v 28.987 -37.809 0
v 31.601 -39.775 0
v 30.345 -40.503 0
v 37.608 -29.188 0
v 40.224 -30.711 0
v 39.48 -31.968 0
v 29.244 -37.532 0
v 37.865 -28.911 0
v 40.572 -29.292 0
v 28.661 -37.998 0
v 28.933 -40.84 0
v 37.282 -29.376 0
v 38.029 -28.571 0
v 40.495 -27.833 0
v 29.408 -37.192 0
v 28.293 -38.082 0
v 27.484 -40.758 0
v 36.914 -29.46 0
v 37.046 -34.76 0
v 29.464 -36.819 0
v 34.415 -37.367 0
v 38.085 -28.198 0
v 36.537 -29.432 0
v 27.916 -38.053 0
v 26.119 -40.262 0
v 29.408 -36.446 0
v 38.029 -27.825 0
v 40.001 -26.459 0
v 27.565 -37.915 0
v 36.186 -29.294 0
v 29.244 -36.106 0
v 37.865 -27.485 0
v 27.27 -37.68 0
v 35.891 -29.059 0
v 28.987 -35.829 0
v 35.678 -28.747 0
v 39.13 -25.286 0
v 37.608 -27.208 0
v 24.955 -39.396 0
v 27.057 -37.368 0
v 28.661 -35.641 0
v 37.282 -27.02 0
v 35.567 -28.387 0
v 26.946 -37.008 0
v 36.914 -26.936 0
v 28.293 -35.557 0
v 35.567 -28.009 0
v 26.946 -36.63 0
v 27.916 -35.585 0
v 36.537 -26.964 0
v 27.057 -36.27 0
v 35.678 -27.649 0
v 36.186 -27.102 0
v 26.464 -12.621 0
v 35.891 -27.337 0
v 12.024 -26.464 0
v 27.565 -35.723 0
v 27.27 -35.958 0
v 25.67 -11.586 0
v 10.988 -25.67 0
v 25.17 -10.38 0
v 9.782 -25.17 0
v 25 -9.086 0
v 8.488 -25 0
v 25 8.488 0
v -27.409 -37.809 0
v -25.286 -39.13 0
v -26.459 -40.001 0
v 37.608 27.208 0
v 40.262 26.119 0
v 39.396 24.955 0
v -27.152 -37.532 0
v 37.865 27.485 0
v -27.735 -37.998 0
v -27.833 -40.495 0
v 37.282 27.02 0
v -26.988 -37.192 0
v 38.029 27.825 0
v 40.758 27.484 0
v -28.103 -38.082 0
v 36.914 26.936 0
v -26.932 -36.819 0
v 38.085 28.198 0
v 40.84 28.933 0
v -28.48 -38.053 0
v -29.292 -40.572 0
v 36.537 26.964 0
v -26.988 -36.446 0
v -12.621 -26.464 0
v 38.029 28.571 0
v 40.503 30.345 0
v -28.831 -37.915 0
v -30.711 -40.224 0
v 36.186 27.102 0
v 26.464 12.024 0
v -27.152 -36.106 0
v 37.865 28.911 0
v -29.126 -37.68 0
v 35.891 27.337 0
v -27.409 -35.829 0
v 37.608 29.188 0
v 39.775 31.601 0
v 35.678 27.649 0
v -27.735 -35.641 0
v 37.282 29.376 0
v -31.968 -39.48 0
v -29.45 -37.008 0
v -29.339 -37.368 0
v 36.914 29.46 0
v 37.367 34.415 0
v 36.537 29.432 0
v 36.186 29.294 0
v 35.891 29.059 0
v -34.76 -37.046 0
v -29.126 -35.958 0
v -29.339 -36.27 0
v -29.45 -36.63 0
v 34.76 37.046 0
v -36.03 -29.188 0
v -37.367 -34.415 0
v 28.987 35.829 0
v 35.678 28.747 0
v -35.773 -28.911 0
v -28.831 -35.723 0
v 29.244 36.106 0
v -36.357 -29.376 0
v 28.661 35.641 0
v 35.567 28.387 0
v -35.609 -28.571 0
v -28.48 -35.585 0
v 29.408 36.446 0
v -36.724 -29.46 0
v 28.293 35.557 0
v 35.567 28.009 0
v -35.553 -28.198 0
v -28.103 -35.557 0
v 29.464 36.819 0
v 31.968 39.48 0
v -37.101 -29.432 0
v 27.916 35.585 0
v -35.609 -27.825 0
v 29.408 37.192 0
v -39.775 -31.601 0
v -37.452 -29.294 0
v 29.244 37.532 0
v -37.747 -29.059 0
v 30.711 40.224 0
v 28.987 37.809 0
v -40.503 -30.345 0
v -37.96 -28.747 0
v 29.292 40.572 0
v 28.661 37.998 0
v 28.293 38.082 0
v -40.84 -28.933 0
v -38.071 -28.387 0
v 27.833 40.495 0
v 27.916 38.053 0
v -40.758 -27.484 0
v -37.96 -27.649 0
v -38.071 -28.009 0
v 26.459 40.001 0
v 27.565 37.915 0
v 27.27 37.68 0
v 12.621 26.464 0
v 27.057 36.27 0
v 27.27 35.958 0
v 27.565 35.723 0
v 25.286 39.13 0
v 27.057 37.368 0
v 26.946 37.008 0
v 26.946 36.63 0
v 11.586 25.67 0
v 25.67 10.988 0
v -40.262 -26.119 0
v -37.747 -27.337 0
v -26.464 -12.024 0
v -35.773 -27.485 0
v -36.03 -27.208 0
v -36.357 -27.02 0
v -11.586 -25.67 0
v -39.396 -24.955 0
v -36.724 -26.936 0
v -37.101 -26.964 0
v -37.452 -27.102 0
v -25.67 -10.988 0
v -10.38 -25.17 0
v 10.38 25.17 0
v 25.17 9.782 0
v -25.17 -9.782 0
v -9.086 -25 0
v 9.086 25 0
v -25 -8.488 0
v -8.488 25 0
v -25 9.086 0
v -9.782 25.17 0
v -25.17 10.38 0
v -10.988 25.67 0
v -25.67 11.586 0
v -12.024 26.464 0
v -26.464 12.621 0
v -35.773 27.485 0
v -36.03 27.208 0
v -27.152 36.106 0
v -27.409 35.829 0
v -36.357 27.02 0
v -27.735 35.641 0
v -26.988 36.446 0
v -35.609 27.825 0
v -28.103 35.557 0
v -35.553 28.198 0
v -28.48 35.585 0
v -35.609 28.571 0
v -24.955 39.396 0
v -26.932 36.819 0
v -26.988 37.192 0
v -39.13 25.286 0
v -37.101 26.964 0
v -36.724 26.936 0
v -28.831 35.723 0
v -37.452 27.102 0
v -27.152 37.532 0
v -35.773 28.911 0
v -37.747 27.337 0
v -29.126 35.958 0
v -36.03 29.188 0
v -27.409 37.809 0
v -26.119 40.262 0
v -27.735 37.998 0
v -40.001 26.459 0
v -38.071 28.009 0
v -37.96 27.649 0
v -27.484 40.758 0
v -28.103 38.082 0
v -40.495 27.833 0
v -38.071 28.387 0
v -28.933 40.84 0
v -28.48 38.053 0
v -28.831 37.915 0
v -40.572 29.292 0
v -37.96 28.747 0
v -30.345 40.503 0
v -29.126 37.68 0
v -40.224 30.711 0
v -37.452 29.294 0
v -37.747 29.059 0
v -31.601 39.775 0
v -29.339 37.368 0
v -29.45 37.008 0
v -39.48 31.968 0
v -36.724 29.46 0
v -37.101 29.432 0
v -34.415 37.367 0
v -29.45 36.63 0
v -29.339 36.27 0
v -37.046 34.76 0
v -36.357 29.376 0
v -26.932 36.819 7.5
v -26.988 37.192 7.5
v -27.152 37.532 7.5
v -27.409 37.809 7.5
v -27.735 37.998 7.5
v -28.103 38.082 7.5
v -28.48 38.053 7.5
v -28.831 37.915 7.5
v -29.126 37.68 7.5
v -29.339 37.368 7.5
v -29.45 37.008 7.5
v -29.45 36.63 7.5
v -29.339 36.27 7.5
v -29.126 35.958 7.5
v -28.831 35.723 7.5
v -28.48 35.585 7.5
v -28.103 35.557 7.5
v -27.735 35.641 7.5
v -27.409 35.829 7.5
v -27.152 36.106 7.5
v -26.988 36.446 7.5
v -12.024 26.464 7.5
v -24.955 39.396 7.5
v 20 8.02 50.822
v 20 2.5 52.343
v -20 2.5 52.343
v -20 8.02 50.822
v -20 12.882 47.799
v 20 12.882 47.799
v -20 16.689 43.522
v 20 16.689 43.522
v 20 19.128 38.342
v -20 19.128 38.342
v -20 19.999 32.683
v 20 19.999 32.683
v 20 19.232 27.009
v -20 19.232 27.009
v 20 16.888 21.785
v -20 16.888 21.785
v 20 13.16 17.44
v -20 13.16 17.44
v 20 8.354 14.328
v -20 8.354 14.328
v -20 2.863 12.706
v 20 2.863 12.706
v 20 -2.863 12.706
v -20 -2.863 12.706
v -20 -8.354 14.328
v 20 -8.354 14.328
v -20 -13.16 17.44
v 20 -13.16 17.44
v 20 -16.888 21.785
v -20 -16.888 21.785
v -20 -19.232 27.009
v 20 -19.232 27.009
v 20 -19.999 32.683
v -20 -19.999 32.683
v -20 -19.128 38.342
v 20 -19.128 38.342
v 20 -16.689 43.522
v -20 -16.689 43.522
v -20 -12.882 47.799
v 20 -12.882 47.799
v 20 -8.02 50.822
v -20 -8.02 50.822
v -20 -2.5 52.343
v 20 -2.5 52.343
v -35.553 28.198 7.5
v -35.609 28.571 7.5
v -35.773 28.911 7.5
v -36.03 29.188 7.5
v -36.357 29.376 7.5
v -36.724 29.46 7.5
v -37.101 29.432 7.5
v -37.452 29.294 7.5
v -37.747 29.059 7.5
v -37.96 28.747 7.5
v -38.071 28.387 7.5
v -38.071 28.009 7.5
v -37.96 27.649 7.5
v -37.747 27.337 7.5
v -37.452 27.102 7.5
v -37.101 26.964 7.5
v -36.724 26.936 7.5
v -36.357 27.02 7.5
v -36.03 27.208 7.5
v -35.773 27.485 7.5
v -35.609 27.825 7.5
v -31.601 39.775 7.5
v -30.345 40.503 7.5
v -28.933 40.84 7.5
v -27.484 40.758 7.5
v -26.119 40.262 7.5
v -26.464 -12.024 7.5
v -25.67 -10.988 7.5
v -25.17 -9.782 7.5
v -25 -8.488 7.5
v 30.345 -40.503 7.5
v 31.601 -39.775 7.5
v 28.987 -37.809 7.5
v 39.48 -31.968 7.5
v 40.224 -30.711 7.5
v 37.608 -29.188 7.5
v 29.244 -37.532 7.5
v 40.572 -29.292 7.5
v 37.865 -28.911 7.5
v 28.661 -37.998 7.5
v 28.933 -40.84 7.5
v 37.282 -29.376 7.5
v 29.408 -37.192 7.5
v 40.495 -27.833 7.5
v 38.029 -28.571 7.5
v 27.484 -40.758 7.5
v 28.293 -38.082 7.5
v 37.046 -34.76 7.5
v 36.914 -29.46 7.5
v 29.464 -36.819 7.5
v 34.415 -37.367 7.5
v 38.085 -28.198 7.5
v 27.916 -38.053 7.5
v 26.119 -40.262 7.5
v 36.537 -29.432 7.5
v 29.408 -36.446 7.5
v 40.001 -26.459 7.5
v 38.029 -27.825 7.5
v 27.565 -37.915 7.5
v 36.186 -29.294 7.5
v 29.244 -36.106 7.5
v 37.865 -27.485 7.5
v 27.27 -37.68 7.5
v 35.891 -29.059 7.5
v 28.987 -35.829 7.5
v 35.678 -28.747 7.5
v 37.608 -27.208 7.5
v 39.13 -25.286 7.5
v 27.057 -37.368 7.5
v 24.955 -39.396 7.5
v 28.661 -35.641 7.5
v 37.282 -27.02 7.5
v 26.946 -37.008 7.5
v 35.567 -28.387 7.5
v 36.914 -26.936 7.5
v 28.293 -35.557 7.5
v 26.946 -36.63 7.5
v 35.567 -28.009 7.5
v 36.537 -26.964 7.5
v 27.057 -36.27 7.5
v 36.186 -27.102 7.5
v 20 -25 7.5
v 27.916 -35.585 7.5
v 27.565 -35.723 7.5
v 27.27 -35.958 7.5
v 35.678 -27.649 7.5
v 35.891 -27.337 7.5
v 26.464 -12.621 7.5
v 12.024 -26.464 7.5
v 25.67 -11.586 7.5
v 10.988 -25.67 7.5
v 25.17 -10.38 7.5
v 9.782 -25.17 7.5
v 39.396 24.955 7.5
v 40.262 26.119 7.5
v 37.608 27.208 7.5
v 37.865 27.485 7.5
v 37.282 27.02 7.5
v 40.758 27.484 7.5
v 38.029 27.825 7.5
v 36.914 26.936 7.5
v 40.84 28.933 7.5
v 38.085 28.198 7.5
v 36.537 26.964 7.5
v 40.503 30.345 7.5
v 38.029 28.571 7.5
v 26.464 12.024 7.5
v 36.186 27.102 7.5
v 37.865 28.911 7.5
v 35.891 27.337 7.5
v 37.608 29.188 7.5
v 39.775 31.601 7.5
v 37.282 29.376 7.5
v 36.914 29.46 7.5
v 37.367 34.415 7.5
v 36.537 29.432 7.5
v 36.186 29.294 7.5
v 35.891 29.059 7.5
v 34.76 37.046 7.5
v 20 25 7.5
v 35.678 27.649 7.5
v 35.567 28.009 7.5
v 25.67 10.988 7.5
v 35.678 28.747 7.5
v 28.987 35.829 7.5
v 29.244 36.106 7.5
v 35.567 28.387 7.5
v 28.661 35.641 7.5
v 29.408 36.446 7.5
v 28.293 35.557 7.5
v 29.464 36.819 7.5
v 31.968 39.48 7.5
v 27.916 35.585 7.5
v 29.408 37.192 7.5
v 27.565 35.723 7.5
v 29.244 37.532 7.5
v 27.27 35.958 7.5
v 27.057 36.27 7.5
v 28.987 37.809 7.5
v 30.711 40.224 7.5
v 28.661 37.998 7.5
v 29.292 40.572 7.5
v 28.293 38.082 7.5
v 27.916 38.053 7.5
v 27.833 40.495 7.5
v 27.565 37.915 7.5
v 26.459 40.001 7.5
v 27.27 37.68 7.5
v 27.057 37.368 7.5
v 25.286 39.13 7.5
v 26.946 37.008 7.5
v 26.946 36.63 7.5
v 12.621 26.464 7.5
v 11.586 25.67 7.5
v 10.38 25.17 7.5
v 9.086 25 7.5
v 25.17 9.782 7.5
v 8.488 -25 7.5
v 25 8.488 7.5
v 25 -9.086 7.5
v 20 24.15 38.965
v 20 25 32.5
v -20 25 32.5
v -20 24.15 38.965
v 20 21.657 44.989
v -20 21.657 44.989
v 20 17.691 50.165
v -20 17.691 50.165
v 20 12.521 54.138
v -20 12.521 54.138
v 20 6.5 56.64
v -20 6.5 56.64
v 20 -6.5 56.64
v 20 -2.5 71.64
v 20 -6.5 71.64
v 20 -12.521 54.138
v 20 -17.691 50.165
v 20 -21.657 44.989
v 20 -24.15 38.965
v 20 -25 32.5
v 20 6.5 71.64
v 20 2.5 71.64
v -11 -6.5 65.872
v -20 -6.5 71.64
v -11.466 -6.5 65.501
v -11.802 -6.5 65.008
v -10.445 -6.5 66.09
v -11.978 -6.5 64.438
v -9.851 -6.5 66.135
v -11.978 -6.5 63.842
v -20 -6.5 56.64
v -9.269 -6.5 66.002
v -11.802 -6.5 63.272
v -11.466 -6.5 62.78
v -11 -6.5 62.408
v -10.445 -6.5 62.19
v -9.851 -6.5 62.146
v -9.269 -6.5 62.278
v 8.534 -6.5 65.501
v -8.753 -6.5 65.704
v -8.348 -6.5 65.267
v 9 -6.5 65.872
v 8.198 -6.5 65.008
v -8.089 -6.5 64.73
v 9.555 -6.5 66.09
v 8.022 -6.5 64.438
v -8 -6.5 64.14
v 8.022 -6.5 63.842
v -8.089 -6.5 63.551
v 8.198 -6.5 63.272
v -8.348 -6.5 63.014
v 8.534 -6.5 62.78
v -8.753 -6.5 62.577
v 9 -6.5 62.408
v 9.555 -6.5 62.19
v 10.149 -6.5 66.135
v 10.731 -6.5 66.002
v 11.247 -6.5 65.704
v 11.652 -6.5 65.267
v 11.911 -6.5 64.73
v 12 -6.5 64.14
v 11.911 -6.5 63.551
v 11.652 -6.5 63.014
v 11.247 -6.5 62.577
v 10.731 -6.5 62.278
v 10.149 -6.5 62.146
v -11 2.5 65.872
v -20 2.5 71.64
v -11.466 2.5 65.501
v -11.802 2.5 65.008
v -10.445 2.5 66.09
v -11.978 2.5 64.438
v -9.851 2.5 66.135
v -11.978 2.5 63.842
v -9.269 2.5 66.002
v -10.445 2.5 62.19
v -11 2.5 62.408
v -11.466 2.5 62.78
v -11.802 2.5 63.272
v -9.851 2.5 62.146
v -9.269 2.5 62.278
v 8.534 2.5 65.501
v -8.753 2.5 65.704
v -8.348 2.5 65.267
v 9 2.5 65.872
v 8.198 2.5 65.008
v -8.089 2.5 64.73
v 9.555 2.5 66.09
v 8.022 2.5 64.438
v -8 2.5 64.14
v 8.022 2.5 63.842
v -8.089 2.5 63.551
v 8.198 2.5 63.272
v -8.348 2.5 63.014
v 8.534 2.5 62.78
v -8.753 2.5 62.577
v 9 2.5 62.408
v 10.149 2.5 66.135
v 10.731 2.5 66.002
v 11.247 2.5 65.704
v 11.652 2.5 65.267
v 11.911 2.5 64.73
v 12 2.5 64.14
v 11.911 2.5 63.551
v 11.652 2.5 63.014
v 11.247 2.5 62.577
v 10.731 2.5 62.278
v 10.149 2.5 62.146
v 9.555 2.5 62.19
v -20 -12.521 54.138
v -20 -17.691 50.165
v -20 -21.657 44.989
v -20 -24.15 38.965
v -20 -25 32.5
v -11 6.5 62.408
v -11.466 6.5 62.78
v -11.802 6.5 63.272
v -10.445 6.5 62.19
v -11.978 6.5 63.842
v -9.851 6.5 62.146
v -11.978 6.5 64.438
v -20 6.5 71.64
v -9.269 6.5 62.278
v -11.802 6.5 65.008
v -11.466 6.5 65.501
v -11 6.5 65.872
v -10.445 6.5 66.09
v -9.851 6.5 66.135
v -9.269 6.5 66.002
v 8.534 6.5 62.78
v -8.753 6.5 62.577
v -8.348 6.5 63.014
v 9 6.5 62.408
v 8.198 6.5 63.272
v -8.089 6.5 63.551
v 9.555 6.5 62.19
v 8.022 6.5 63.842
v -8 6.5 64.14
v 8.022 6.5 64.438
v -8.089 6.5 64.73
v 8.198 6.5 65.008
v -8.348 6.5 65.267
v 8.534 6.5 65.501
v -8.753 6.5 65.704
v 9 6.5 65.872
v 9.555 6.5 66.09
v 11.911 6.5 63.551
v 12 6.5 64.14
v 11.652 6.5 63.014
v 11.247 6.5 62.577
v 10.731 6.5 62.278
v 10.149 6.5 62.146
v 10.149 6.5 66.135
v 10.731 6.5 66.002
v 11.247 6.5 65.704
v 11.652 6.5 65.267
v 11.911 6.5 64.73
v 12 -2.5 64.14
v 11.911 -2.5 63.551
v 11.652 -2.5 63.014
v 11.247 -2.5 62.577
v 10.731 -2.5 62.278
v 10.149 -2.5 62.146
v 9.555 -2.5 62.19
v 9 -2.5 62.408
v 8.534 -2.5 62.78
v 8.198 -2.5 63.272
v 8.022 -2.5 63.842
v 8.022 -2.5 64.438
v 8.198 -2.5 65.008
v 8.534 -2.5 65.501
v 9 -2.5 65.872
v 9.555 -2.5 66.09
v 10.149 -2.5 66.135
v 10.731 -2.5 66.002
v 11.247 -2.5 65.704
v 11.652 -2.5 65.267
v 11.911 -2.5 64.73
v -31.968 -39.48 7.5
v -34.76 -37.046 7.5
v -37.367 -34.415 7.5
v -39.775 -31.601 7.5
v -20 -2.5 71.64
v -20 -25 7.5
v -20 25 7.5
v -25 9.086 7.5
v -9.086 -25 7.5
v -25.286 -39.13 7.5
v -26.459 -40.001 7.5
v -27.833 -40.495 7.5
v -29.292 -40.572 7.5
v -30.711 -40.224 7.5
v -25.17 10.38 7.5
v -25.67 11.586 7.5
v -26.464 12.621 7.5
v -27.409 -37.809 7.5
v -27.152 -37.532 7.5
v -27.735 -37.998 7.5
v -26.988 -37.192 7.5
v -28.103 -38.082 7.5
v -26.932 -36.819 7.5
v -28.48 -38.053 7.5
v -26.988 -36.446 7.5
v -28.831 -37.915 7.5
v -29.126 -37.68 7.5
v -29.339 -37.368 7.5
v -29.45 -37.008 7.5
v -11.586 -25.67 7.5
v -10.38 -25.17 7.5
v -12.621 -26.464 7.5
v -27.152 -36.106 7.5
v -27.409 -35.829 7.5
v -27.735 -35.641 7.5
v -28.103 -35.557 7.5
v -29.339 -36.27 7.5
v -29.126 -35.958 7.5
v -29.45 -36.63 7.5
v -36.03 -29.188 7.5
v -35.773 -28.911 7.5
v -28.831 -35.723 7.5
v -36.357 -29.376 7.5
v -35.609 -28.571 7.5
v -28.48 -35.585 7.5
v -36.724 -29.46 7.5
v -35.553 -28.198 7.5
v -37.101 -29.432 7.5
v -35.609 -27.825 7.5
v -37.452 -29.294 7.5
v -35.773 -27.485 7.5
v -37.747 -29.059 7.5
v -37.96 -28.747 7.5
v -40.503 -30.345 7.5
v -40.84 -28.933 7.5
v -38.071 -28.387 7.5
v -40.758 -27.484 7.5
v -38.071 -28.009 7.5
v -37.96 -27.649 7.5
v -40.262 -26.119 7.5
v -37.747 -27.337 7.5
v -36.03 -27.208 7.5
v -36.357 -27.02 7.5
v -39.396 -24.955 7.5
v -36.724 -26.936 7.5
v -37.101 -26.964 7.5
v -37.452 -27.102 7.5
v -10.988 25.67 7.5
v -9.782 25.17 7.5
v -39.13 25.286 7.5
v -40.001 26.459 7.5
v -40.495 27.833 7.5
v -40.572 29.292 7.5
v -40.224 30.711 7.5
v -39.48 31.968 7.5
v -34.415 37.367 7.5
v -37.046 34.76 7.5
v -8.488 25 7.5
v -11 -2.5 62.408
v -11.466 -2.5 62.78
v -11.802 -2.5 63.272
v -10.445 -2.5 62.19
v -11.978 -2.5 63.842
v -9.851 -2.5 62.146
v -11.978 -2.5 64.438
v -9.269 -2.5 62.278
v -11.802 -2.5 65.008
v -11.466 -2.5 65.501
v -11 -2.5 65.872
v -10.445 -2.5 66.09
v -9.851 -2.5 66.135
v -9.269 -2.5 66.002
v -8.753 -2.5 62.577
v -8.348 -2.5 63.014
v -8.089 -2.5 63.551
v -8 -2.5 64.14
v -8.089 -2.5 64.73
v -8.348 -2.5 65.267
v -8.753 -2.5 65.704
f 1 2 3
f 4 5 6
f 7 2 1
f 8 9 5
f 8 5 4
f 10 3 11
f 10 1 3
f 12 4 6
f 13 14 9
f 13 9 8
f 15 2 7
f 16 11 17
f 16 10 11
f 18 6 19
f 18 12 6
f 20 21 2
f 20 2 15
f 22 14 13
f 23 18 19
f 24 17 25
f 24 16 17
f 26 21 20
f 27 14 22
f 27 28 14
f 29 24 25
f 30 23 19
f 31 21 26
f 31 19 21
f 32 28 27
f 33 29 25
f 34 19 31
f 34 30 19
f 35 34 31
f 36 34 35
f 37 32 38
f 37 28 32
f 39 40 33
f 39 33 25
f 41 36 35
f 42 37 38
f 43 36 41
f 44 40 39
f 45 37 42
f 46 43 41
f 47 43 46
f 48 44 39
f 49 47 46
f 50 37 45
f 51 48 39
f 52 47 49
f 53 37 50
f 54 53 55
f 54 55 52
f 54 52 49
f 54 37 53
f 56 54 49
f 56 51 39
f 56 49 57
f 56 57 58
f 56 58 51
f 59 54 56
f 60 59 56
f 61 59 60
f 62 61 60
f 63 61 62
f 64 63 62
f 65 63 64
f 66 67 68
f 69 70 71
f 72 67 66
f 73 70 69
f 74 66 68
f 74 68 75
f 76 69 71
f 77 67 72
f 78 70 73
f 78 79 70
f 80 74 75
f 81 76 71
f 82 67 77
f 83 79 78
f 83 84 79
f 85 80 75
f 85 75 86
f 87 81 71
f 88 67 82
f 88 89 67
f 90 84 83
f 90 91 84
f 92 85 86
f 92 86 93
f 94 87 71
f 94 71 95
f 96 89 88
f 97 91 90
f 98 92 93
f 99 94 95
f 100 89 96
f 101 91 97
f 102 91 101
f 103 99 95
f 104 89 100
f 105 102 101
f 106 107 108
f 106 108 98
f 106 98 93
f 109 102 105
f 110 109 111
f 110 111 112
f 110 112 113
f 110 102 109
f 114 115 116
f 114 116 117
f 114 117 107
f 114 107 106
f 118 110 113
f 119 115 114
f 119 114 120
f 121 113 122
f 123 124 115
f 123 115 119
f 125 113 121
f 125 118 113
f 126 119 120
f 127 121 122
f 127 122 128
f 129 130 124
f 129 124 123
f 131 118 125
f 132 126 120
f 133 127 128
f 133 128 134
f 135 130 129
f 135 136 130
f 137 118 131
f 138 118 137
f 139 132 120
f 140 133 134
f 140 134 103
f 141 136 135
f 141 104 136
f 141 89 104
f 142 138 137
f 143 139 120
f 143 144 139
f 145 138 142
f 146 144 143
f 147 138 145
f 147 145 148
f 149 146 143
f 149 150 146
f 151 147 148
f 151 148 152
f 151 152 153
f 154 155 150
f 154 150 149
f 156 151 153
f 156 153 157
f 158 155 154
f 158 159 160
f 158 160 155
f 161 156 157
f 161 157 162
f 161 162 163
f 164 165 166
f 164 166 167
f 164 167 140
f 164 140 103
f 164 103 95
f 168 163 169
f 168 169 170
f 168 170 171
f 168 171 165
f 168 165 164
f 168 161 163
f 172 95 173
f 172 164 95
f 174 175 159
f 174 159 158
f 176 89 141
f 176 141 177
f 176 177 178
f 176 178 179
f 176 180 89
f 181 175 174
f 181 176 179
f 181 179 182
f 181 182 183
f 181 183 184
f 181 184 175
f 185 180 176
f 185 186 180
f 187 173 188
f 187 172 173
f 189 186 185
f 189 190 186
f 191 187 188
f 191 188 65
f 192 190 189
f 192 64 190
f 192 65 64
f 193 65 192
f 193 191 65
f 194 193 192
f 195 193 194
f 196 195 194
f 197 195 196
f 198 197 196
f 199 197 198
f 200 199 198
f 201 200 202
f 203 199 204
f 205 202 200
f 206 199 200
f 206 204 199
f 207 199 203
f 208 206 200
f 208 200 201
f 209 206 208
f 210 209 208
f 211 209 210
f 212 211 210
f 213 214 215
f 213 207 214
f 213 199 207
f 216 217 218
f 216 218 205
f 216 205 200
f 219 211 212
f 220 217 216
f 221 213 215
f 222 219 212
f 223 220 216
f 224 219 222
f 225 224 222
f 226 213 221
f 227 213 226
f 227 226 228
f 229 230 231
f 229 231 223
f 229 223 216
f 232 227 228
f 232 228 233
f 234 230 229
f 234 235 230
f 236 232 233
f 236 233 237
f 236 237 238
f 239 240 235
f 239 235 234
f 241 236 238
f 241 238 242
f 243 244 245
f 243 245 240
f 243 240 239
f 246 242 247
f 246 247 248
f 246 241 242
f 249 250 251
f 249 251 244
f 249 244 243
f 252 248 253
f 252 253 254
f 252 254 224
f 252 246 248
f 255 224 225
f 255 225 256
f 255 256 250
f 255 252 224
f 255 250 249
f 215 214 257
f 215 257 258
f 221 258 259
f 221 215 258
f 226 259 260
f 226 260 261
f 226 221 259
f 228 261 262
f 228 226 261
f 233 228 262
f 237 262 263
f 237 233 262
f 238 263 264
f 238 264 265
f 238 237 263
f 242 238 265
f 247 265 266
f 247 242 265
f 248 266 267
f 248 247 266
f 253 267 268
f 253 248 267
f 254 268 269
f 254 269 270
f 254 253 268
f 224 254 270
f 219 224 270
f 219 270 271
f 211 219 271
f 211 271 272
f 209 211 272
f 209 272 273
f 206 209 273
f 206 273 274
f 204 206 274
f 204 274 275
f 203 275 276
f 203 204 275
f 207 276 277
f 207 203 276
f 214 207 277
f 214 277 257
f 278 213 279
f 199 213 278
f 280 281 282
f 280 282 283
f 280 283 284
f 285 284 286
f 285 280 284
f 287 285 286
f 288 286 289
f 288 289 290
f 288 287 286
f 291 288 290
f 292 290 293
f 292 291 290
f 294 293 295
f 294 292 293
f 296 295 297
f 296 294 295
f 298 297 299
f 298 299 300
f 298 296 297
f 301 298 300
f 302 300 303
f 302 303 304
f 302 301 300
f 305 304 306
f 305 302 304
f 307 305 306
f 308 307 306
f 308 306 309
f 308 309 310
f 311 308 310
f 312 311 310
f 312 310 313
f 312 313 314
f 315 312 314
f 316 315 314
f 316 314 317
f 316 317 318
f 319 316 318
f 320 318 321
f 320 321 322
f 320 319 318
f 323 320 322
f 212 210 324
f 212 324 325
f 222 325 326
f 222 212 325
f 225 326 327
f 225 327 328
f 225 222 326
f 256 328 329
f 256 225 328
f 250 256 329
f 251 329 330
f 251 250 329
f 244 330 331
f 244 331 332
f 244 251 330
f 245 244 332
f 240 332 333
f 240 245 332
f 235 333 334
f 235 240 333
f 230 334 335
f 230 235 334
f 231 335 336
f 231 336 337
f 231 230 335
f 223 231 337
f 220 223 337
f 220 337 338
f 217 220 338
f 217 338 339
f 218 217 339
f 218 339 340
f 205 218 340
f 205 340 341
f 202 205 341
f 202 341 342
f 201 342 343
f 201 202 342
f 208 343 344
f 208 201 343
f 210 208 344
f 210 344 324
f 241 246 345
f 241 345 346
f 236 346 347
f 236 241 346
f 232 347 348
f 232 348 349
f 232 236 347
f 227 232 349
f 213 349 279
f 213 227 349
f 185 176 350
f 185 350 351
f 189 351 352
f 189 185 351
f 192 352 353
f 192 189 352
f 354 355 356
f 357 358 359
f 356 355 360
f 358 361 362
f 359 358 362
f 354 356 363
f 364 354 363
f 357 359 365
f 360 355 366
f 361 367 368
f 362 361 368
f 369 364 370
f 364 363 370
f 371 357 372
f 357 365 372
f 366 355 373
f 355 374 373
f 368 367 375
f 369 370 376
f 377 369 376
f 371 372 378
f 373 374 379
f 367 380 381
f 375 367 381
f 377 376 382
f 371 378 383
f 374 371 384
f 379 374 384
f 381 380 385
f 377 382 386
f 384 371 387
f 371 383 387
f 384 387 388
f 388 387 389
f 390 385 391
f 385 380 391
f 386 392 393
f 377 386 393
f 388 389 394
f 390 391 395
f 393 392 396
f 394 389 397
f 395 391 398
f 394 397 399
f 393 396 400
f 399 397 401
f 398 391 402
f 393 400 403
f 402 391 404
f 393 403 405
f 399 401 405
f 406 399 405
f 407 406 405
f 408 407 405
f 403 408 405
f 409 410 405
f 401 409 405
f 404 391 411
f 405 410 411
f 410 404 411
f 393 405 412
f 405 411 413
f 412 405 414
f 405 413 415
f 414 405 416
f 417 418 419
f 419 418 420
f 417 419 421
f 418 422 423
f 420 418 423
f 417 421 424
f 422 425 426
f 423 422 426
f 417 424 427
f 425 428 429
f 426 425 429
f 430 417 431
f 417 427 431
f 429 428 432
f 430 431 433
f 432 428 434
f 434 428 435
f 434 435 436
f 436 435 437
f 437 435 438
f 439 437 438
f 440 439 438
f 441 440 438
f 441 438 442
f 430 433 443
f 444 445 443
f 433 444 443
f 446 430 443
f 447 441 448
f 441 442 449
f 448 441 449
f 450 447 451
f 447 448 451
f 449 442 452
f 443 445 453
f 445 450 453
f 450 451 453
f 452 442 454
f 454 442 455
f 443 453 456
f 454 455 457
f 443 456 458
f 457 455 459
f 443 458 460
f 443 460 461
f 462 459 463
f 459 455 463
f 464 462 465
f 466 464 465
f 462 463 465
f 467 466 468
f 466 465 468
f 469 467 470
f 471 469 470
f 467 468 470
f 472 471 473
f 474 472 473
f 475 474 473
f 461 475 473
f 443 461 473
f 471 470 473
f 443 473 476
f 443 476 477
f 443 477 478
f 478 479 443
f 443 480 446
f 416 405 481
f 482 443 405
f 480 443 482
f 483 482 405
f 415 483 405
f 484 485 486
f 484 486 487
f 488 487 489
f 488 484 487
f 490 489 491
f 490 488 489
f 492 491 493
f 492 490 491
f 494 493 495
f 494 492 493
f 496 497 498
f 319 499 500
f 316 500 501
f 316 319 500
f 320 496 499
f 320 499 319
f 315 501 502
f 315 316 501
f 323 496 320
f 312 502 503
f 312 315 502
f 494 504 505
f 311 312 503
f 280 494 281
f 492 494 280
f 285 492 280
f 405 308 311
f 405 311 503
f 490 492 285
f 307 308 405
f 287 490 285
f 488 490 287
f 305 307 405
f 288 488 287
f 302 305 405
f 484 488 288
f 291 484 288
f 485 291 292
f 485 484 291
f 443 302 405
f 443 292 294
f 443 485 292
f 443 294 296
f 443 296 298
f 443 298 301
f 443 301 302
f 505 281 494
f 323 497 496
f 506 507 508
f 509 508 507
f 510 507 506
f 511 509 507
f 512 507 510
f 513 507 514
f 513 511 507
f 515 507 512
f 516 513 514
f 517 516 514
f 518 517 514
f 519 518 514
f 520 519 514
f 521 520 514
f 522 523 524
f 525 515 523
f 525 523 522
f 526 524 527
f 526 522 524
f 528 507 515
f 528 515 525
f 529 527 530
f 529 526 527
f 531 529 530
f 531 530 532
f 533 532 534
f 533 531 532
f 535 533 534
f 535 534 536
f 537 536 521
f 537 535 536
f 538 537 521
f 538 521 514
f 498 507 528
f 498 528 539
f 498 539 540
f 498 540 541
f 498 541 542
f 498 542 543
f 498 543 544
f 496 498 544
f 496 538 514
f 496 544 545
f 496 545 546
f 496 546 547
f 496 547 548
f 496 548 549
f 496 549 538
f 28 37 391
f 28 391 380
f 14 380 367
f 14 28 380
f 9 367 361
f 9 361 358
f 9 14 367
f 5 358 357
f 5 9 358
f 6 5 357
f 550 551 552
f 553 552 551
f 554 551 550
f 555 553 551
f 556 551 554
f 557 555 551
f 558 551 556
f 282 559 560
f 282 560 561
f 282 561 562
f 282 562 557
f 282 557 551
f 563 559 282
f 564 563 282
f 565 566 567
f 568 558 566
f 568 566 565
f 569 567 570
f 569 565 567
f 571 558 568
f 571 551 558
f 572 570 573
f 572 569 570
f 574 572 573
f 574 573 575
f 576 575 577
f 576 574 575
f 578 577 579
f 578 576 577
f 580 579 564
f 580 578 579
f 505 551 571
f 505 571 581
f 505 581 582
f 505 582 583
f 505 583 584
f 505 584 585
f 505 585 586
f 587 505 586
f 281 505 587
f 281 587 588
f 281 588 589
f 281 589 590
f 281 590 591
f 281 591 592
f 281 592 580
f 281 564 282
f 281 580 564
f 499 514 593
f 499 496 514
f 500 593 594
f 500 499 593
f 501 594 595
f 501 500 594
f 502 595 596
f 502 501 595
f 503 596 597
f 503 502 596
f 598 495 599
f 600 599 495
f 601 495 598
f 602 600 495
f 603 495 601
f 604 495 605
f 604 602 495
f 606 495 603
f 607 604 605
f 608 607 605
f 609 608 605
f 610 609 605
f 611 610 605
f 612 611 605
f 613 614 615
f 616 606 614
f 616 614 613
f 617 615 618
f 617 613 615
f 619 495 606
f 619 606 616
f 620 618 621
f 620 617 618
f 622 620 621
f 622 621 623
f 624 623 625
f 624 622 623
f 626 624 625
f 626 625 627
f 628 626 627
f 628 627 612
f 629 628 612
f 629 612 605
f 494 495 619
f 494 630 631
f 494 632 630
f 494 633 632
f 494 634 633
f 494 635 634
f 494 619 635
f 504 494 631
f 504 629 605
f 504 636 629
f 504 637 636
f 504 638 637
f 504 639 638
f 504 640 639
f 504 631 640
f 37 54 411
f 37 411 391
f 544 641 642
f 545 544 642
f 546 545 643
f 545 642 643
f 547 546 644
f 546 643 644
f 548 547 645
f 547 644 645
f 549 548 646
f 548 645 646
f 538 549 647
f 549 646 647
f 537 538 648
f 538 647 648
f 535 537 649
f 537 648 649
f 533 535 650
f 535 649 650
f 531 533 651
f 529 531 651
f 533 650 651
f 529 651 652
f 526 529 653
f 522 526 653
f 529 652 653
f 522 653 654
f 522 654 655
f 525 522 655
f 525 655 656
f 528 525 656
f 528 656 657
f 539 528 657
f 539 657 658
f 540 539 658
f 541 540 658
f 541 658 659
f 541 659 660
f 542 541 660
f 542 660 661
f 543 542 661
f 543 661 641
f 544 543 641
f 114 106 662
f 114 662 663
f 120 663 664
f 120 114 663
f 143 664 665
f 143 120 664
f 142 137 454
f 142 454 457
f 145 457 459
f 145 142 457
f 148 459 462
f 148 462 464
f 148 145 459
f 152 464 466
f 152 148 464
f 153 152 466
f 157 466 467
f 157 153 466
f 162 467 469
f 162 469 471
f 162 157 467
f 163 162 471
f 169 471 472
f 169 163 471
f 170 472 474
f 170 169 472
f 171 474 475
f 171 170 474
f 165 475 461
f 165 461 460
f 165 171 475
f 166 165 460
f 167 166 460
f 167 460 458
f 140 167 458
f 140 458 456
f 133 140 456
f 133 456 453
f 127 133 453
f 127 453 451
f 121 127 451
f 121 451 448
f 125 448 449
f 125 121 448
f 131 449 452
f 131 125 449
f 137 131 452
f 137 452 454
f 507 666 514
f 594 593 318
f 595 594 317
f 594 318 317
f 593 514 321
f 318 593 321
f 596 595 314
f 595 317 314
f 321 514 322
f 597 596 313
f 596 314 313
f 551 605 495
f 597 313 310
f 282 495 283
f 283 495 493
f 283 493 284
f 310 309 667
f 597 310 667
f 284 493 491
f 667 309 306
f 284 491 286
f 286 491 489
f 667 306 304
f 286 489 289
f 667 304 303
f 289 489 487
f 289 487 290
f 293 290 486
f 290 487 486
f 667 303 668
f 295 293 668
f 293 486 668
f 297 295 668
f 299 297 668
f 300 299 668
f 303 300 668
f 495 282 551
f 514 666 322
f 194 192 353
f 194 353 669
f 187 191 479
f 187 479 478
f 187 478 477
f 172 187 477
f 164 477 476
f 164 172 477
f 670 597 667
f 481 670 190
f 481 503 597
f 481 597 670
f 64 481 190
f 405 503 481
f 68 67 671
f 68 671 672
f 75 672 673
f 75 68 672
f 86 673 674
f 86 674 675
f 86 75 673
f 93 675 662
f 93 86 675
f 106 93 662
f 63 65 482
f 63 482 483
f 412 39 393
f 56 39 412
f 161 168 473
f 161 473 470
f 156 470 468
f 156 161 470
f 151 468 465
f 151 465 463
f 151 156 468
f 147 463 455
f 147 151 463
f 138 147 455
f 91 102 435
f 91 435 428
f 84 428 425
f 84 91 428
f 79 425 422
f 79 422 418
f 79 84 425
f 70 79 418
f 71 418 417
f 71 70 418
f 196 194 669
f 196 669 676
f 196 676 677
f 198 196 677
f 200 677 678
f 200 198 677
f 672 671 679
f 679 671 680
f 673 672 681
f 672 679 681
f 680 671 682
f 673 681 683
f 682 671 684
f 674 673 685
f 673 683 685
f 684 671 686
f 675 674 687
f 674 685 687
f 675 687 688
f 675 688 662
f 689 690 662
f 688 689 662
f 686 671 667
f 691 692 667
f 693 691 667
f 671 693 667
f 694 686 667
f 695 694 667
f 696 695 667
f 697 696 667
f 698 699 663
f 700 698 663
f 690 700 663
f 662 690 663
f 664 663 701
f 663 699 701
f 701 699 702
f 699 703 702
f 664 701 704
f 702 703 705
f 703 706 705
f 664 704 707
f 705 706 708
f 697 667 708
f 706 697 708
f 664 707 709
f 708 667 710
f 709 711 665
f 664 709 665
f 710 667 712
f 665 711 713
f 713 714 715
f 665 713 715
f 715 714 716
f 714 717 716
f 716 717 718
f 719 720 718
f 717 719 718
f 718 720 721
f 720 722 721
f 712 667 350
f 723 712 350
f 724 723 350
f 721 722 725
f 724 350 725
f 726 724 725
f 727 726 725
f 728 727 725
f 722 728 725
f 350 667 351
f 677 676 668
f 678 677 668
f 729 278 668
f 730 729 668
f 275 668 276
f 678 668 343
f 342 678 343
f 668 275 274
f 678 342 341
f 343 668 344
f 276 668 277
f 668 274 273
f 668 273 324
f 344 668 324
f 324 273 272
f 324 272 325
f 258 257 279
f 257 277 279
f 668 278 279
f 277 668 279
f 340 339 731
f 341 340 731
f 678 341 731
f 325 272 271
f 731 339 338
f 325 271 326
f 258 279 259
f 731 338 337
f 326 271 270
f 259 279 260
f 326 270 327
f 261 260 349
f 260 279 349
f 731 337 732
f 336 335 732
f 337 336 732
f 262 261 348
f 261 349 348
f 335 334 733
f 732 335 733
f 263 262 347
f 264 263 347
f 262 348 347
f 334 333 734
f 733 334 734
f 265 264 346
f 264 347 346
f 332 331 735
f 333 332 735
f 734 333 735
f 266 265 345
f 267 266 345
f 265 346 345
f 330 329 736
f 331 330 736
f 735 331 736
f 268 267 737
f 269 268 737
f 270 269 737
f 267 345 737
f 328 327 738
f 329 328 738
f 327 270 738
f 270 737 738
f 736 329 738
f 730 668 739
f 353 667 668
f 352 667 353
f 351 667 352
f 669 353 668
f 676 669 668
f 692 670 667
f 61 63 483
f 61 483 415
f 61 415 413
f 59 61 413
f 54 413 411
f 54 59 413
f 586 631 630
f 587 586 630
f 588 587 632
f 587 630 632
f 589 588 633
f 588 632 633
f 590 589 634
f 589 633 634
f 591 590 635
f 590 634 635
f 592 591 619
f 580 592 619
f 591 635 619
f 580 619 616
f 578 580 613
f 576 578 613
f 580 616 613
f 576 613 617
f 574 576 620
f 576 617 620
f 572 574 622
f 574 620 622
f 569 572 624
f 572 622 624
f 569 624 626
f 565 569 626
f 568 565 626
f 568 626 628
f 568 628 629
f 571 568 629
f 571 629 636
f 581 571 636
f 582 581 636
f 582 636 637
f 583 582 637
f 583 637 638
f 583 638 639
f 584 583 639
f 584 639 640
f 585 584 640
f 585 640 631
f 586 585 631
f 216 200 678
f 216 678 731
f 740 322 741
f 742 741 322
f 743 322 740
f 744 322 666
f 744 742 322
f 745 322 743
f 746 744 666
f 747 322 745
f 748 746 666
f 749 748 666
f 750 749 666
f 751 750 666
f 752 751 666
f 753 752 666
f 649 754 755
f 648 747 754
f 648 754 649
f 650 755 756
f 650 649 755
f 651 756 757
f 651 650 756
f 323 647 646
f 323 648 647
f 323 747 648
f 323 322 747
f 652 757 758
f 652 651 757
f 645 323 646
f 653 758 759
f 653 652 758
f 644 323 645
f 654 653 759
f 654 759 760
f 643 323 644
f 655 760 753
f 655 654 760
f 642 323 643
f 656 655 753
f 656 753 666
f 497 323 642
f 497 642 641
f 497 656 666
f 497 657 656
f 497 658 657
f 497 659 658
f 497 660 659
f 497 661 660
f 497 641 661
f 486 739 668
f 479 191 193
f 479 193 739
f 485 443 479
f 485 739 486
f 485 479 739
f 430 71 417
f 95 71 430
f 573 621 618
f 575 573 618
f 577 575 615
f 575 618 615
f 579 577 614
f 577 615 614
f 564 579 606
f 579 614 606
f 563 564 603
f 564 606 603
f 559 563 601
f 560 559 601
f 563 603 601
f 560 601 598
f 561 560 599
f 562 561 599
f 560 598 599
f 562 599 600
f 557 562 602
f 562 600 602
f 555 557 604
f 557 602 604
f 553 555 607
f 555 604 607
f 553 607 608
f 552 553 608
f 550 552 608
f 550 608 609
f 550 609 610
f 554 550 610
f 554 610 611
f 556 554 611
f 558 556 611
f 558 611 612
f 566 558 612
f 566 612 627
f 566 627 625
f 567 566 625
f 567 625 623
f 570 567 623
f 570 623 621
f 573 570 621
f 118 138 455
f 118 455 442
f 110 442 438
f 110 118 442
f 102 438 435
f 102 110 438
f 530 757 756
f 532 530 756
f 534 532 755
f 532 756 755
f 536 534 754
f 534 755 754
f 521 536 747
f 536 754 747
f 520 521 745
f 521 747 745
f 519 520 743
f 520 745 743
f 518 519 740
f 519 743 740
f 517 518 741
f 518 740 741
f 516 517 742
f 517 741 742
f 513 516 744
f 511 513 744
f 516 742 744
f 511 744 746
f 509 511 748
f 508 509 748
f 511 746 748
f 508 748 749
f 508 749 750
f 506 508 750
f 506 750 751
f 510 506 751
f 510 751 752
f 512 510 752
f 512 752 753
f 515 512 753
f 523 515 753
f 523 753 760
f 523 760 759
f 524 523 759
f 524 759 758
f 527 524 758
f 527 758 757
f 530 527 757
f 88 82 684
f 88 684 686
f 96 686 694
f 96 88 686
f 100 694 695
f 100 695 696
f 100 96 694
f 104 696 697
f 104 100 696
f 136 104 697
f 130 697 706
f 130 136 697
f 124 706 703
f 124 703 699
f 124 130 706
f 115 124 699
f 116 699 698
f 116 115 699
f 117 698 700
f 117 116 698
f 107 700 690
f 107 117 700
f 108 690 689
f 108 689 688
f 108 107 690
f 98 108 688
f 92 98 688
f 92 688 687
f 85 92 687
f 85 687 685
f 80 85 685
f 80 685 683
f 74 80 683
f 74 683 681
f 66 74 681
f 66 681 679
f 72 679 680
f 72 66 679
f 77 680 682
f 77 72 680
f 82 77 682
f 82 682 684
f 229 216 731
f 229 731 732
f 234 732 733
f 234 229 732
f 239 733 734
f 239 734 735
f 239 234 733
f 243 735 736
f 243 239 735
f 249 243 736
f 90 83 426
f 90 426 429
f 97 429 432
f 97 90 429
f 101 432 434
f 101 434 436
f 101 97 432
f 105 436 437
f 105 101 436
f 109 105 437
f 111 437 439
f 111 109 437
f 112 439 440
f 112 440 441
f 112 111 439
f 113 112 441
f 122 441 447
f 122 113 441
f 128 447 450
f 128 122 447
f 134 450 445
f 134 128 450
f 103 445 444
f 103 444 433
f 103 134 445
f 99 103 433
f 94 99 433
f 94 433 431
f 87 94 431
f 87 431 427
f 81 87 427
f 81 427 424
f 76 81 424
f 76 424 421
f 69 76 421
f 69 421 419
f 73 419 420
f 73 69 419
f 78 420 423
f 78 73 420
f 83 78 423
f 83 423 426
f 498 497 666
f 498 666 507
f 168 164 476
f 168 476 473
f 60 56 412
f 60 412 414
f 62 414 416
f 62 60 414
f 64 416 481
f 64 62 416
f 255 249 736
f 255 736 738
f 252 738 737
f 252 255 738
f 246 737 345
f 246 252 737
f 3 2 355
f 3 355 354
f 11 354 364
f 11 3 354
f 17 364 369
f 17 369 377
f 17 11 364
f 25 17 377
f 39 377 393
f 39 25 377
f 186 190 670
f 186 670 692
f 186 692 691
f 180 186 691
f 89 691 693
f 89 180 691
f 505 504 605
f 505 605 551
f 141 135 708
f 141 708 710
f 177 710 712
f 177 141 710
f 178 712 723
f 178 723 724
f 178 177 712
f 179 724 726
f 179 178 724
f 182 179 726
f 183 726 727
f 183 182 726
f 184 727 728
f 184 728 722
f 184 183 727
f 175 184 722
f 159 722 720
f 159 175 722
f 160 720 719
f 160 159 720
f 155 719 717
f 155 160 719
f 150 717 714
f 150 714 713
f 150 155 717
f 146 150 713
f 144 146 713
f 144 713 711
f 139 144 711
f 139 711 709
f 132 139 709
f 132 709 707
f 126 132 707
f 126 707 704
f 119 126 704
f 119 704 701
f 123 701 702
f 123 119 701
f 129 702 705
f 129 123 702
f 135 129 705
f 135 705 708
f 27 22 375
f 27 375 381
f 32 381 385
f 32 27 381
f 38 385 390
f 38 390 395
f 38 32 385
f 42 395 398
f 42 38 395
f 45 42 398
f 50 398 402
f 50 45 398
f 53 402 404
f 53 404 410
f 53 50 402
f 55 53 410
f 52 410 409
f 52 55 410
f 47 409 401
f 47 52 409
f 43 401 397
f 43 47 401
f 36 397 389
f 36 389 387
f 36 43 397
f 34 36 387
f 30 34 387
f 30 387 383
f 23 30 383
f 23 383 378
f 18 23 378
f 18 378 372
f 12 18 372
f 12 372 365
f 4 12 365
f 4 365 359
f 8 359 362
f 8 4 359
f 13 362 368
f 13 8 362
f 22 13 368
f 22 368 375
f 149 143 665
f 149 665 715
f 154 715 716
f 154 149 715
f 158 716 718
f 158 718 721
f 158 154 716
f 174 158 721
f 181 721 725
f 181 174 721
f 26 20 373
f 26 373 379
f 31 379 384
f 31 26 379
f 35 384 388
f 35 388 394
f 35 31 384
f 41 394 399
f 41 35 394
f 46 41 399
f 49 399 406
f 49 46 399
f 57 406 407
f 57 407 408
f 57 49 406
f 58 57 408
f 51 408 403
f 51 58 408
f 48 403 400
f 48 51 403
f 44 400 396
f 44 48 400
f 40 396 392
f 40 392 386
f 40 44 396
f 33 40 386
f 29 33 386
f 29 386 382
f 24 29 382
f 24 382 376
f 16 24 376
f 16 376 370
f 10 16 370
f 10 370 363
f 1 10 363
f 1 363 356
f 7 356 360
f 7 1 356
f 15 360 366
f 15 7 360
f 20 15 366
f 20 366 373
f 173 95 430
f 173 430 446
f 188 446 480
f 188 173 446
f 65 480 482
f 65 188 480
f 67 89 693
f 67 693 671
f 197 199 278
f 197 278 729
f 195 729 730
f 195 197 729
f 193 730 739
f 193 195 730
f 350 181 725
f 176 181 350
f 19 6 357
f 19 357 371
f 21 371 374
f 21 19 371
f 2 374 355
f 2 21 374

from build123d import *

# Parameters (mm, degrees)
SKETCH8_R           = 1.266
BOSS_EXTRUDE3_DEPTH = 7.5
BOSS_EXTRUDE4_DEPTH = 20
SKETCH10_R          = 2
CUT_EXTRUDE3_DEPTH  = 13


with BuildPart() as part:
    # Sketch8 → Boss-Extrude3 (new body)
    with BuildSketch(Plane.XY):
        with BuildLine():
            Line((-26.464466094, 12.621101614), (-39.129662609, 25.286298129))
            ThreePointArc((-39.129662609, 25.286298129), (-40.587272547, 28.560079176), (-39.479950614, 31.968320248))
            ThreePointArc((-39.479950614, 31.968320248), (-35.753947361, 36.087328082), (-31.600536501, 39.774943028))
            ThreePointArc((-31.600536501, 39.774943028), (-28.205326911, 40.851961857), (-24.954713569, 39.395620337))
            Line((-24.954713569, 39.395620337), (-12.023559327, 26.464466094))
            ThreePointArc((-12.023559327, 26.464466094), (-10.401442583, 25.380602337), (-8.488025421, 25))
            Line((-8.488025421, 25), (9.085567708, 25))
            ThreePointArc((9.085567708, 25), (10.99898487, 25.380602337), (12.621101614, 26.464466094))
            Line((12.621101614, 26.464466094), (25.286298129, 39.129662609))
            ThreePointArc((25.286298129, 39.129662609), (28.560079176, 40.587272547), (31.968320248, 39.479950614))
            ThreePointArc((31.968320248, 39.479950614), (36.087328082, 35.753947361), (39.774943028, 31.600536501))
            ThreePointArc((39.774943028, 31.600536501), (40.851961857, 28.205326911), (39.395620337, 24.954713569))
            Line((39.395620337, 24.954713569), (26.464466094, 12.023559327))
            ThreePointArc((26.464466094, 12.023559327), (25.380602337, 10.401442583), (25, 8.488025421))
            Line((25, 8.488025421), (25, -9.085567708))
            ThreePointArc((25, -9.085567708), (25.380602337, -10.99898487), (26.464466094, -12.621101614))
            Line((26.464466094, -12.621101614), (39.129662609, -25.286298129))
            ThreePointArc((39.129662609, -25.286298129), (40.587272547, -28.560079176), (39.479950614, -31.968320248))
            ThreePointArc((39.479950614, -31.968320248), (35.753947361, -36.087328082), (31.600536501, -39.774943028))
            ThreePointArc((31.600536501, -39.774943028), (28.205326911, -40.851961857), (24.954713569, -39.395620337))
            Line((24.954713569, -39.395620337), (12.023559327, -26.464466094))
            ThreePointArc((12.023559327, -26.464466094), (10.401442583, -25.380602337), (8.488025421, -25))
            Line((8.488025421, -25), (-9.085567708, -25))
            ThreePointArc((-9.085567708, -25), (-10.99898487, -25.380602337), (-12.621101614, -26.464466094))
            Line((-12.621101614, -26.464466094), (-25.286298129, -39.129662609))
            ThreePointArc((-25.286298129, -39.129662609), (-28.560079176, -40.587272547), (-31.968320248, -39.479950614))
            ThreePointArc((-31.968320248, -39.479950614), (-36.087328082, -35.753947361), (-39.774943028, -31.600536501))
            ThreePointArc((-39.774943028, -31.600536501), (-40.851961857, -28.205326911), (-39.395620337, -24.954713569))
            Line((-39.395620337, -24.954713569), (-26.464466094, -12.023559327))
            ThreePointArc((-26.464466094, -12.023559327), (-25.380602337, -10.401442583), (-25, -8.488025421))
            Line((-25, -8.488025421), (-25, 9.085567708))
            ThreePointArc((-25, 9.085567708), (-25.380602337, 10.99898487), (-26.464466094, 12.621101614))
        make_face()
        with Locations((-28.19800422, -36.819050096)):
            Circle(SKETCH8_R, mode=Mode.SUBTRACT)
        with Locations((-36.819050096, -28.19800422)):
            Circle(SKETCH8_R, mode=Mode.SUBTRACT)
        with Locations((-36.819050096, 28.19800422)):
            Circle(SKETCH8_R, mode=Mode.SUBTRACT)
        with Locations((-28.19800422, 36.819050096)):
            Circle(SKETCH8_R, mode=Mode.SUBTRACT)
        with Locations((28.19800422, 36.819050096)):
            Circle(SKETCH8_R, mode=Mode.SUBTRACT)
        with Locations((36.819050096, 28.19800422)):
            Circle(SKETCH8_R, mode=Mode.SUBTRACT)
        with Locations((36.819050096, -28.19800422)):
            Circle(SKETCH8_R, mode=Mode.SUBTRACT)
        with Locations((28.19800422, -36.819050096)):
            Circle(SKETCH8_R, mode=Mode.SUBTRACT)
    extrude(amount=BOSS_EXTRUDE3_DEPTH)

    # Sketch9 → Boss-Extrude4 (add, symmetric)
    with BuildSketch(Plane(origin=(0, 0, 0), x_dir=(0, 0, -1), z_dir=(1, 0, 0))):
        with BuildLine():
            Line((-7.5, -25), (-7.5, 25))
            Line((-7.5, 25), (-32.5, 25))
            ThreePointArc((-32.5, 25), (-47.706906326, 19.843134833), (-56.640215409, 6.5))
            Line((-56.640215409, 6.5), (-71.640215409, 6.5))
            Line((-71.640215409, 6.5), (-71.640215409, 2.5))
            Line((-71.640215409, 2.5), (-52.343134833, 2.5))
            ThreePointArc((-52.343134833, 2.5), (-12.5, 0), (-52.343134833, -2.5))
            Line((-52.343134833, -2.5), (-71.640215409, -2.5))
            Line((-71.640215409, -2.5), (-71.640215409, -6.5))
            Line((-71.640215409, -6.5), (-56.640215409, -6.5))
            ThreePointArc((-56.640215409, -6.5), (-47.706906326, -19.843134833), (-32.5, -25))
            Line((-32.5, -25), (-7.5, -25))
        make_face()
    extrude(amount=BOSS_EXTRUDE4_DEPTH, both=True)

    # Sketch10 → Cut-Extrude3 (cut)
    with BuildSketch(Plane(origin=(0, 6.5, 0), x_dir=(1, 0, 0), z_dir=(0, 1, 0))):
        with Locations((-10, -64.140215409)):
            Circle(SKETCH10_R)
        with Locations((10, -64.140215409)):
            Circle(SKETCH10_R)
    extrude(amount=-CUT_EXTRUDE3_DEPTH, mode=Mode.SUBTRACT)


solid = part.part
